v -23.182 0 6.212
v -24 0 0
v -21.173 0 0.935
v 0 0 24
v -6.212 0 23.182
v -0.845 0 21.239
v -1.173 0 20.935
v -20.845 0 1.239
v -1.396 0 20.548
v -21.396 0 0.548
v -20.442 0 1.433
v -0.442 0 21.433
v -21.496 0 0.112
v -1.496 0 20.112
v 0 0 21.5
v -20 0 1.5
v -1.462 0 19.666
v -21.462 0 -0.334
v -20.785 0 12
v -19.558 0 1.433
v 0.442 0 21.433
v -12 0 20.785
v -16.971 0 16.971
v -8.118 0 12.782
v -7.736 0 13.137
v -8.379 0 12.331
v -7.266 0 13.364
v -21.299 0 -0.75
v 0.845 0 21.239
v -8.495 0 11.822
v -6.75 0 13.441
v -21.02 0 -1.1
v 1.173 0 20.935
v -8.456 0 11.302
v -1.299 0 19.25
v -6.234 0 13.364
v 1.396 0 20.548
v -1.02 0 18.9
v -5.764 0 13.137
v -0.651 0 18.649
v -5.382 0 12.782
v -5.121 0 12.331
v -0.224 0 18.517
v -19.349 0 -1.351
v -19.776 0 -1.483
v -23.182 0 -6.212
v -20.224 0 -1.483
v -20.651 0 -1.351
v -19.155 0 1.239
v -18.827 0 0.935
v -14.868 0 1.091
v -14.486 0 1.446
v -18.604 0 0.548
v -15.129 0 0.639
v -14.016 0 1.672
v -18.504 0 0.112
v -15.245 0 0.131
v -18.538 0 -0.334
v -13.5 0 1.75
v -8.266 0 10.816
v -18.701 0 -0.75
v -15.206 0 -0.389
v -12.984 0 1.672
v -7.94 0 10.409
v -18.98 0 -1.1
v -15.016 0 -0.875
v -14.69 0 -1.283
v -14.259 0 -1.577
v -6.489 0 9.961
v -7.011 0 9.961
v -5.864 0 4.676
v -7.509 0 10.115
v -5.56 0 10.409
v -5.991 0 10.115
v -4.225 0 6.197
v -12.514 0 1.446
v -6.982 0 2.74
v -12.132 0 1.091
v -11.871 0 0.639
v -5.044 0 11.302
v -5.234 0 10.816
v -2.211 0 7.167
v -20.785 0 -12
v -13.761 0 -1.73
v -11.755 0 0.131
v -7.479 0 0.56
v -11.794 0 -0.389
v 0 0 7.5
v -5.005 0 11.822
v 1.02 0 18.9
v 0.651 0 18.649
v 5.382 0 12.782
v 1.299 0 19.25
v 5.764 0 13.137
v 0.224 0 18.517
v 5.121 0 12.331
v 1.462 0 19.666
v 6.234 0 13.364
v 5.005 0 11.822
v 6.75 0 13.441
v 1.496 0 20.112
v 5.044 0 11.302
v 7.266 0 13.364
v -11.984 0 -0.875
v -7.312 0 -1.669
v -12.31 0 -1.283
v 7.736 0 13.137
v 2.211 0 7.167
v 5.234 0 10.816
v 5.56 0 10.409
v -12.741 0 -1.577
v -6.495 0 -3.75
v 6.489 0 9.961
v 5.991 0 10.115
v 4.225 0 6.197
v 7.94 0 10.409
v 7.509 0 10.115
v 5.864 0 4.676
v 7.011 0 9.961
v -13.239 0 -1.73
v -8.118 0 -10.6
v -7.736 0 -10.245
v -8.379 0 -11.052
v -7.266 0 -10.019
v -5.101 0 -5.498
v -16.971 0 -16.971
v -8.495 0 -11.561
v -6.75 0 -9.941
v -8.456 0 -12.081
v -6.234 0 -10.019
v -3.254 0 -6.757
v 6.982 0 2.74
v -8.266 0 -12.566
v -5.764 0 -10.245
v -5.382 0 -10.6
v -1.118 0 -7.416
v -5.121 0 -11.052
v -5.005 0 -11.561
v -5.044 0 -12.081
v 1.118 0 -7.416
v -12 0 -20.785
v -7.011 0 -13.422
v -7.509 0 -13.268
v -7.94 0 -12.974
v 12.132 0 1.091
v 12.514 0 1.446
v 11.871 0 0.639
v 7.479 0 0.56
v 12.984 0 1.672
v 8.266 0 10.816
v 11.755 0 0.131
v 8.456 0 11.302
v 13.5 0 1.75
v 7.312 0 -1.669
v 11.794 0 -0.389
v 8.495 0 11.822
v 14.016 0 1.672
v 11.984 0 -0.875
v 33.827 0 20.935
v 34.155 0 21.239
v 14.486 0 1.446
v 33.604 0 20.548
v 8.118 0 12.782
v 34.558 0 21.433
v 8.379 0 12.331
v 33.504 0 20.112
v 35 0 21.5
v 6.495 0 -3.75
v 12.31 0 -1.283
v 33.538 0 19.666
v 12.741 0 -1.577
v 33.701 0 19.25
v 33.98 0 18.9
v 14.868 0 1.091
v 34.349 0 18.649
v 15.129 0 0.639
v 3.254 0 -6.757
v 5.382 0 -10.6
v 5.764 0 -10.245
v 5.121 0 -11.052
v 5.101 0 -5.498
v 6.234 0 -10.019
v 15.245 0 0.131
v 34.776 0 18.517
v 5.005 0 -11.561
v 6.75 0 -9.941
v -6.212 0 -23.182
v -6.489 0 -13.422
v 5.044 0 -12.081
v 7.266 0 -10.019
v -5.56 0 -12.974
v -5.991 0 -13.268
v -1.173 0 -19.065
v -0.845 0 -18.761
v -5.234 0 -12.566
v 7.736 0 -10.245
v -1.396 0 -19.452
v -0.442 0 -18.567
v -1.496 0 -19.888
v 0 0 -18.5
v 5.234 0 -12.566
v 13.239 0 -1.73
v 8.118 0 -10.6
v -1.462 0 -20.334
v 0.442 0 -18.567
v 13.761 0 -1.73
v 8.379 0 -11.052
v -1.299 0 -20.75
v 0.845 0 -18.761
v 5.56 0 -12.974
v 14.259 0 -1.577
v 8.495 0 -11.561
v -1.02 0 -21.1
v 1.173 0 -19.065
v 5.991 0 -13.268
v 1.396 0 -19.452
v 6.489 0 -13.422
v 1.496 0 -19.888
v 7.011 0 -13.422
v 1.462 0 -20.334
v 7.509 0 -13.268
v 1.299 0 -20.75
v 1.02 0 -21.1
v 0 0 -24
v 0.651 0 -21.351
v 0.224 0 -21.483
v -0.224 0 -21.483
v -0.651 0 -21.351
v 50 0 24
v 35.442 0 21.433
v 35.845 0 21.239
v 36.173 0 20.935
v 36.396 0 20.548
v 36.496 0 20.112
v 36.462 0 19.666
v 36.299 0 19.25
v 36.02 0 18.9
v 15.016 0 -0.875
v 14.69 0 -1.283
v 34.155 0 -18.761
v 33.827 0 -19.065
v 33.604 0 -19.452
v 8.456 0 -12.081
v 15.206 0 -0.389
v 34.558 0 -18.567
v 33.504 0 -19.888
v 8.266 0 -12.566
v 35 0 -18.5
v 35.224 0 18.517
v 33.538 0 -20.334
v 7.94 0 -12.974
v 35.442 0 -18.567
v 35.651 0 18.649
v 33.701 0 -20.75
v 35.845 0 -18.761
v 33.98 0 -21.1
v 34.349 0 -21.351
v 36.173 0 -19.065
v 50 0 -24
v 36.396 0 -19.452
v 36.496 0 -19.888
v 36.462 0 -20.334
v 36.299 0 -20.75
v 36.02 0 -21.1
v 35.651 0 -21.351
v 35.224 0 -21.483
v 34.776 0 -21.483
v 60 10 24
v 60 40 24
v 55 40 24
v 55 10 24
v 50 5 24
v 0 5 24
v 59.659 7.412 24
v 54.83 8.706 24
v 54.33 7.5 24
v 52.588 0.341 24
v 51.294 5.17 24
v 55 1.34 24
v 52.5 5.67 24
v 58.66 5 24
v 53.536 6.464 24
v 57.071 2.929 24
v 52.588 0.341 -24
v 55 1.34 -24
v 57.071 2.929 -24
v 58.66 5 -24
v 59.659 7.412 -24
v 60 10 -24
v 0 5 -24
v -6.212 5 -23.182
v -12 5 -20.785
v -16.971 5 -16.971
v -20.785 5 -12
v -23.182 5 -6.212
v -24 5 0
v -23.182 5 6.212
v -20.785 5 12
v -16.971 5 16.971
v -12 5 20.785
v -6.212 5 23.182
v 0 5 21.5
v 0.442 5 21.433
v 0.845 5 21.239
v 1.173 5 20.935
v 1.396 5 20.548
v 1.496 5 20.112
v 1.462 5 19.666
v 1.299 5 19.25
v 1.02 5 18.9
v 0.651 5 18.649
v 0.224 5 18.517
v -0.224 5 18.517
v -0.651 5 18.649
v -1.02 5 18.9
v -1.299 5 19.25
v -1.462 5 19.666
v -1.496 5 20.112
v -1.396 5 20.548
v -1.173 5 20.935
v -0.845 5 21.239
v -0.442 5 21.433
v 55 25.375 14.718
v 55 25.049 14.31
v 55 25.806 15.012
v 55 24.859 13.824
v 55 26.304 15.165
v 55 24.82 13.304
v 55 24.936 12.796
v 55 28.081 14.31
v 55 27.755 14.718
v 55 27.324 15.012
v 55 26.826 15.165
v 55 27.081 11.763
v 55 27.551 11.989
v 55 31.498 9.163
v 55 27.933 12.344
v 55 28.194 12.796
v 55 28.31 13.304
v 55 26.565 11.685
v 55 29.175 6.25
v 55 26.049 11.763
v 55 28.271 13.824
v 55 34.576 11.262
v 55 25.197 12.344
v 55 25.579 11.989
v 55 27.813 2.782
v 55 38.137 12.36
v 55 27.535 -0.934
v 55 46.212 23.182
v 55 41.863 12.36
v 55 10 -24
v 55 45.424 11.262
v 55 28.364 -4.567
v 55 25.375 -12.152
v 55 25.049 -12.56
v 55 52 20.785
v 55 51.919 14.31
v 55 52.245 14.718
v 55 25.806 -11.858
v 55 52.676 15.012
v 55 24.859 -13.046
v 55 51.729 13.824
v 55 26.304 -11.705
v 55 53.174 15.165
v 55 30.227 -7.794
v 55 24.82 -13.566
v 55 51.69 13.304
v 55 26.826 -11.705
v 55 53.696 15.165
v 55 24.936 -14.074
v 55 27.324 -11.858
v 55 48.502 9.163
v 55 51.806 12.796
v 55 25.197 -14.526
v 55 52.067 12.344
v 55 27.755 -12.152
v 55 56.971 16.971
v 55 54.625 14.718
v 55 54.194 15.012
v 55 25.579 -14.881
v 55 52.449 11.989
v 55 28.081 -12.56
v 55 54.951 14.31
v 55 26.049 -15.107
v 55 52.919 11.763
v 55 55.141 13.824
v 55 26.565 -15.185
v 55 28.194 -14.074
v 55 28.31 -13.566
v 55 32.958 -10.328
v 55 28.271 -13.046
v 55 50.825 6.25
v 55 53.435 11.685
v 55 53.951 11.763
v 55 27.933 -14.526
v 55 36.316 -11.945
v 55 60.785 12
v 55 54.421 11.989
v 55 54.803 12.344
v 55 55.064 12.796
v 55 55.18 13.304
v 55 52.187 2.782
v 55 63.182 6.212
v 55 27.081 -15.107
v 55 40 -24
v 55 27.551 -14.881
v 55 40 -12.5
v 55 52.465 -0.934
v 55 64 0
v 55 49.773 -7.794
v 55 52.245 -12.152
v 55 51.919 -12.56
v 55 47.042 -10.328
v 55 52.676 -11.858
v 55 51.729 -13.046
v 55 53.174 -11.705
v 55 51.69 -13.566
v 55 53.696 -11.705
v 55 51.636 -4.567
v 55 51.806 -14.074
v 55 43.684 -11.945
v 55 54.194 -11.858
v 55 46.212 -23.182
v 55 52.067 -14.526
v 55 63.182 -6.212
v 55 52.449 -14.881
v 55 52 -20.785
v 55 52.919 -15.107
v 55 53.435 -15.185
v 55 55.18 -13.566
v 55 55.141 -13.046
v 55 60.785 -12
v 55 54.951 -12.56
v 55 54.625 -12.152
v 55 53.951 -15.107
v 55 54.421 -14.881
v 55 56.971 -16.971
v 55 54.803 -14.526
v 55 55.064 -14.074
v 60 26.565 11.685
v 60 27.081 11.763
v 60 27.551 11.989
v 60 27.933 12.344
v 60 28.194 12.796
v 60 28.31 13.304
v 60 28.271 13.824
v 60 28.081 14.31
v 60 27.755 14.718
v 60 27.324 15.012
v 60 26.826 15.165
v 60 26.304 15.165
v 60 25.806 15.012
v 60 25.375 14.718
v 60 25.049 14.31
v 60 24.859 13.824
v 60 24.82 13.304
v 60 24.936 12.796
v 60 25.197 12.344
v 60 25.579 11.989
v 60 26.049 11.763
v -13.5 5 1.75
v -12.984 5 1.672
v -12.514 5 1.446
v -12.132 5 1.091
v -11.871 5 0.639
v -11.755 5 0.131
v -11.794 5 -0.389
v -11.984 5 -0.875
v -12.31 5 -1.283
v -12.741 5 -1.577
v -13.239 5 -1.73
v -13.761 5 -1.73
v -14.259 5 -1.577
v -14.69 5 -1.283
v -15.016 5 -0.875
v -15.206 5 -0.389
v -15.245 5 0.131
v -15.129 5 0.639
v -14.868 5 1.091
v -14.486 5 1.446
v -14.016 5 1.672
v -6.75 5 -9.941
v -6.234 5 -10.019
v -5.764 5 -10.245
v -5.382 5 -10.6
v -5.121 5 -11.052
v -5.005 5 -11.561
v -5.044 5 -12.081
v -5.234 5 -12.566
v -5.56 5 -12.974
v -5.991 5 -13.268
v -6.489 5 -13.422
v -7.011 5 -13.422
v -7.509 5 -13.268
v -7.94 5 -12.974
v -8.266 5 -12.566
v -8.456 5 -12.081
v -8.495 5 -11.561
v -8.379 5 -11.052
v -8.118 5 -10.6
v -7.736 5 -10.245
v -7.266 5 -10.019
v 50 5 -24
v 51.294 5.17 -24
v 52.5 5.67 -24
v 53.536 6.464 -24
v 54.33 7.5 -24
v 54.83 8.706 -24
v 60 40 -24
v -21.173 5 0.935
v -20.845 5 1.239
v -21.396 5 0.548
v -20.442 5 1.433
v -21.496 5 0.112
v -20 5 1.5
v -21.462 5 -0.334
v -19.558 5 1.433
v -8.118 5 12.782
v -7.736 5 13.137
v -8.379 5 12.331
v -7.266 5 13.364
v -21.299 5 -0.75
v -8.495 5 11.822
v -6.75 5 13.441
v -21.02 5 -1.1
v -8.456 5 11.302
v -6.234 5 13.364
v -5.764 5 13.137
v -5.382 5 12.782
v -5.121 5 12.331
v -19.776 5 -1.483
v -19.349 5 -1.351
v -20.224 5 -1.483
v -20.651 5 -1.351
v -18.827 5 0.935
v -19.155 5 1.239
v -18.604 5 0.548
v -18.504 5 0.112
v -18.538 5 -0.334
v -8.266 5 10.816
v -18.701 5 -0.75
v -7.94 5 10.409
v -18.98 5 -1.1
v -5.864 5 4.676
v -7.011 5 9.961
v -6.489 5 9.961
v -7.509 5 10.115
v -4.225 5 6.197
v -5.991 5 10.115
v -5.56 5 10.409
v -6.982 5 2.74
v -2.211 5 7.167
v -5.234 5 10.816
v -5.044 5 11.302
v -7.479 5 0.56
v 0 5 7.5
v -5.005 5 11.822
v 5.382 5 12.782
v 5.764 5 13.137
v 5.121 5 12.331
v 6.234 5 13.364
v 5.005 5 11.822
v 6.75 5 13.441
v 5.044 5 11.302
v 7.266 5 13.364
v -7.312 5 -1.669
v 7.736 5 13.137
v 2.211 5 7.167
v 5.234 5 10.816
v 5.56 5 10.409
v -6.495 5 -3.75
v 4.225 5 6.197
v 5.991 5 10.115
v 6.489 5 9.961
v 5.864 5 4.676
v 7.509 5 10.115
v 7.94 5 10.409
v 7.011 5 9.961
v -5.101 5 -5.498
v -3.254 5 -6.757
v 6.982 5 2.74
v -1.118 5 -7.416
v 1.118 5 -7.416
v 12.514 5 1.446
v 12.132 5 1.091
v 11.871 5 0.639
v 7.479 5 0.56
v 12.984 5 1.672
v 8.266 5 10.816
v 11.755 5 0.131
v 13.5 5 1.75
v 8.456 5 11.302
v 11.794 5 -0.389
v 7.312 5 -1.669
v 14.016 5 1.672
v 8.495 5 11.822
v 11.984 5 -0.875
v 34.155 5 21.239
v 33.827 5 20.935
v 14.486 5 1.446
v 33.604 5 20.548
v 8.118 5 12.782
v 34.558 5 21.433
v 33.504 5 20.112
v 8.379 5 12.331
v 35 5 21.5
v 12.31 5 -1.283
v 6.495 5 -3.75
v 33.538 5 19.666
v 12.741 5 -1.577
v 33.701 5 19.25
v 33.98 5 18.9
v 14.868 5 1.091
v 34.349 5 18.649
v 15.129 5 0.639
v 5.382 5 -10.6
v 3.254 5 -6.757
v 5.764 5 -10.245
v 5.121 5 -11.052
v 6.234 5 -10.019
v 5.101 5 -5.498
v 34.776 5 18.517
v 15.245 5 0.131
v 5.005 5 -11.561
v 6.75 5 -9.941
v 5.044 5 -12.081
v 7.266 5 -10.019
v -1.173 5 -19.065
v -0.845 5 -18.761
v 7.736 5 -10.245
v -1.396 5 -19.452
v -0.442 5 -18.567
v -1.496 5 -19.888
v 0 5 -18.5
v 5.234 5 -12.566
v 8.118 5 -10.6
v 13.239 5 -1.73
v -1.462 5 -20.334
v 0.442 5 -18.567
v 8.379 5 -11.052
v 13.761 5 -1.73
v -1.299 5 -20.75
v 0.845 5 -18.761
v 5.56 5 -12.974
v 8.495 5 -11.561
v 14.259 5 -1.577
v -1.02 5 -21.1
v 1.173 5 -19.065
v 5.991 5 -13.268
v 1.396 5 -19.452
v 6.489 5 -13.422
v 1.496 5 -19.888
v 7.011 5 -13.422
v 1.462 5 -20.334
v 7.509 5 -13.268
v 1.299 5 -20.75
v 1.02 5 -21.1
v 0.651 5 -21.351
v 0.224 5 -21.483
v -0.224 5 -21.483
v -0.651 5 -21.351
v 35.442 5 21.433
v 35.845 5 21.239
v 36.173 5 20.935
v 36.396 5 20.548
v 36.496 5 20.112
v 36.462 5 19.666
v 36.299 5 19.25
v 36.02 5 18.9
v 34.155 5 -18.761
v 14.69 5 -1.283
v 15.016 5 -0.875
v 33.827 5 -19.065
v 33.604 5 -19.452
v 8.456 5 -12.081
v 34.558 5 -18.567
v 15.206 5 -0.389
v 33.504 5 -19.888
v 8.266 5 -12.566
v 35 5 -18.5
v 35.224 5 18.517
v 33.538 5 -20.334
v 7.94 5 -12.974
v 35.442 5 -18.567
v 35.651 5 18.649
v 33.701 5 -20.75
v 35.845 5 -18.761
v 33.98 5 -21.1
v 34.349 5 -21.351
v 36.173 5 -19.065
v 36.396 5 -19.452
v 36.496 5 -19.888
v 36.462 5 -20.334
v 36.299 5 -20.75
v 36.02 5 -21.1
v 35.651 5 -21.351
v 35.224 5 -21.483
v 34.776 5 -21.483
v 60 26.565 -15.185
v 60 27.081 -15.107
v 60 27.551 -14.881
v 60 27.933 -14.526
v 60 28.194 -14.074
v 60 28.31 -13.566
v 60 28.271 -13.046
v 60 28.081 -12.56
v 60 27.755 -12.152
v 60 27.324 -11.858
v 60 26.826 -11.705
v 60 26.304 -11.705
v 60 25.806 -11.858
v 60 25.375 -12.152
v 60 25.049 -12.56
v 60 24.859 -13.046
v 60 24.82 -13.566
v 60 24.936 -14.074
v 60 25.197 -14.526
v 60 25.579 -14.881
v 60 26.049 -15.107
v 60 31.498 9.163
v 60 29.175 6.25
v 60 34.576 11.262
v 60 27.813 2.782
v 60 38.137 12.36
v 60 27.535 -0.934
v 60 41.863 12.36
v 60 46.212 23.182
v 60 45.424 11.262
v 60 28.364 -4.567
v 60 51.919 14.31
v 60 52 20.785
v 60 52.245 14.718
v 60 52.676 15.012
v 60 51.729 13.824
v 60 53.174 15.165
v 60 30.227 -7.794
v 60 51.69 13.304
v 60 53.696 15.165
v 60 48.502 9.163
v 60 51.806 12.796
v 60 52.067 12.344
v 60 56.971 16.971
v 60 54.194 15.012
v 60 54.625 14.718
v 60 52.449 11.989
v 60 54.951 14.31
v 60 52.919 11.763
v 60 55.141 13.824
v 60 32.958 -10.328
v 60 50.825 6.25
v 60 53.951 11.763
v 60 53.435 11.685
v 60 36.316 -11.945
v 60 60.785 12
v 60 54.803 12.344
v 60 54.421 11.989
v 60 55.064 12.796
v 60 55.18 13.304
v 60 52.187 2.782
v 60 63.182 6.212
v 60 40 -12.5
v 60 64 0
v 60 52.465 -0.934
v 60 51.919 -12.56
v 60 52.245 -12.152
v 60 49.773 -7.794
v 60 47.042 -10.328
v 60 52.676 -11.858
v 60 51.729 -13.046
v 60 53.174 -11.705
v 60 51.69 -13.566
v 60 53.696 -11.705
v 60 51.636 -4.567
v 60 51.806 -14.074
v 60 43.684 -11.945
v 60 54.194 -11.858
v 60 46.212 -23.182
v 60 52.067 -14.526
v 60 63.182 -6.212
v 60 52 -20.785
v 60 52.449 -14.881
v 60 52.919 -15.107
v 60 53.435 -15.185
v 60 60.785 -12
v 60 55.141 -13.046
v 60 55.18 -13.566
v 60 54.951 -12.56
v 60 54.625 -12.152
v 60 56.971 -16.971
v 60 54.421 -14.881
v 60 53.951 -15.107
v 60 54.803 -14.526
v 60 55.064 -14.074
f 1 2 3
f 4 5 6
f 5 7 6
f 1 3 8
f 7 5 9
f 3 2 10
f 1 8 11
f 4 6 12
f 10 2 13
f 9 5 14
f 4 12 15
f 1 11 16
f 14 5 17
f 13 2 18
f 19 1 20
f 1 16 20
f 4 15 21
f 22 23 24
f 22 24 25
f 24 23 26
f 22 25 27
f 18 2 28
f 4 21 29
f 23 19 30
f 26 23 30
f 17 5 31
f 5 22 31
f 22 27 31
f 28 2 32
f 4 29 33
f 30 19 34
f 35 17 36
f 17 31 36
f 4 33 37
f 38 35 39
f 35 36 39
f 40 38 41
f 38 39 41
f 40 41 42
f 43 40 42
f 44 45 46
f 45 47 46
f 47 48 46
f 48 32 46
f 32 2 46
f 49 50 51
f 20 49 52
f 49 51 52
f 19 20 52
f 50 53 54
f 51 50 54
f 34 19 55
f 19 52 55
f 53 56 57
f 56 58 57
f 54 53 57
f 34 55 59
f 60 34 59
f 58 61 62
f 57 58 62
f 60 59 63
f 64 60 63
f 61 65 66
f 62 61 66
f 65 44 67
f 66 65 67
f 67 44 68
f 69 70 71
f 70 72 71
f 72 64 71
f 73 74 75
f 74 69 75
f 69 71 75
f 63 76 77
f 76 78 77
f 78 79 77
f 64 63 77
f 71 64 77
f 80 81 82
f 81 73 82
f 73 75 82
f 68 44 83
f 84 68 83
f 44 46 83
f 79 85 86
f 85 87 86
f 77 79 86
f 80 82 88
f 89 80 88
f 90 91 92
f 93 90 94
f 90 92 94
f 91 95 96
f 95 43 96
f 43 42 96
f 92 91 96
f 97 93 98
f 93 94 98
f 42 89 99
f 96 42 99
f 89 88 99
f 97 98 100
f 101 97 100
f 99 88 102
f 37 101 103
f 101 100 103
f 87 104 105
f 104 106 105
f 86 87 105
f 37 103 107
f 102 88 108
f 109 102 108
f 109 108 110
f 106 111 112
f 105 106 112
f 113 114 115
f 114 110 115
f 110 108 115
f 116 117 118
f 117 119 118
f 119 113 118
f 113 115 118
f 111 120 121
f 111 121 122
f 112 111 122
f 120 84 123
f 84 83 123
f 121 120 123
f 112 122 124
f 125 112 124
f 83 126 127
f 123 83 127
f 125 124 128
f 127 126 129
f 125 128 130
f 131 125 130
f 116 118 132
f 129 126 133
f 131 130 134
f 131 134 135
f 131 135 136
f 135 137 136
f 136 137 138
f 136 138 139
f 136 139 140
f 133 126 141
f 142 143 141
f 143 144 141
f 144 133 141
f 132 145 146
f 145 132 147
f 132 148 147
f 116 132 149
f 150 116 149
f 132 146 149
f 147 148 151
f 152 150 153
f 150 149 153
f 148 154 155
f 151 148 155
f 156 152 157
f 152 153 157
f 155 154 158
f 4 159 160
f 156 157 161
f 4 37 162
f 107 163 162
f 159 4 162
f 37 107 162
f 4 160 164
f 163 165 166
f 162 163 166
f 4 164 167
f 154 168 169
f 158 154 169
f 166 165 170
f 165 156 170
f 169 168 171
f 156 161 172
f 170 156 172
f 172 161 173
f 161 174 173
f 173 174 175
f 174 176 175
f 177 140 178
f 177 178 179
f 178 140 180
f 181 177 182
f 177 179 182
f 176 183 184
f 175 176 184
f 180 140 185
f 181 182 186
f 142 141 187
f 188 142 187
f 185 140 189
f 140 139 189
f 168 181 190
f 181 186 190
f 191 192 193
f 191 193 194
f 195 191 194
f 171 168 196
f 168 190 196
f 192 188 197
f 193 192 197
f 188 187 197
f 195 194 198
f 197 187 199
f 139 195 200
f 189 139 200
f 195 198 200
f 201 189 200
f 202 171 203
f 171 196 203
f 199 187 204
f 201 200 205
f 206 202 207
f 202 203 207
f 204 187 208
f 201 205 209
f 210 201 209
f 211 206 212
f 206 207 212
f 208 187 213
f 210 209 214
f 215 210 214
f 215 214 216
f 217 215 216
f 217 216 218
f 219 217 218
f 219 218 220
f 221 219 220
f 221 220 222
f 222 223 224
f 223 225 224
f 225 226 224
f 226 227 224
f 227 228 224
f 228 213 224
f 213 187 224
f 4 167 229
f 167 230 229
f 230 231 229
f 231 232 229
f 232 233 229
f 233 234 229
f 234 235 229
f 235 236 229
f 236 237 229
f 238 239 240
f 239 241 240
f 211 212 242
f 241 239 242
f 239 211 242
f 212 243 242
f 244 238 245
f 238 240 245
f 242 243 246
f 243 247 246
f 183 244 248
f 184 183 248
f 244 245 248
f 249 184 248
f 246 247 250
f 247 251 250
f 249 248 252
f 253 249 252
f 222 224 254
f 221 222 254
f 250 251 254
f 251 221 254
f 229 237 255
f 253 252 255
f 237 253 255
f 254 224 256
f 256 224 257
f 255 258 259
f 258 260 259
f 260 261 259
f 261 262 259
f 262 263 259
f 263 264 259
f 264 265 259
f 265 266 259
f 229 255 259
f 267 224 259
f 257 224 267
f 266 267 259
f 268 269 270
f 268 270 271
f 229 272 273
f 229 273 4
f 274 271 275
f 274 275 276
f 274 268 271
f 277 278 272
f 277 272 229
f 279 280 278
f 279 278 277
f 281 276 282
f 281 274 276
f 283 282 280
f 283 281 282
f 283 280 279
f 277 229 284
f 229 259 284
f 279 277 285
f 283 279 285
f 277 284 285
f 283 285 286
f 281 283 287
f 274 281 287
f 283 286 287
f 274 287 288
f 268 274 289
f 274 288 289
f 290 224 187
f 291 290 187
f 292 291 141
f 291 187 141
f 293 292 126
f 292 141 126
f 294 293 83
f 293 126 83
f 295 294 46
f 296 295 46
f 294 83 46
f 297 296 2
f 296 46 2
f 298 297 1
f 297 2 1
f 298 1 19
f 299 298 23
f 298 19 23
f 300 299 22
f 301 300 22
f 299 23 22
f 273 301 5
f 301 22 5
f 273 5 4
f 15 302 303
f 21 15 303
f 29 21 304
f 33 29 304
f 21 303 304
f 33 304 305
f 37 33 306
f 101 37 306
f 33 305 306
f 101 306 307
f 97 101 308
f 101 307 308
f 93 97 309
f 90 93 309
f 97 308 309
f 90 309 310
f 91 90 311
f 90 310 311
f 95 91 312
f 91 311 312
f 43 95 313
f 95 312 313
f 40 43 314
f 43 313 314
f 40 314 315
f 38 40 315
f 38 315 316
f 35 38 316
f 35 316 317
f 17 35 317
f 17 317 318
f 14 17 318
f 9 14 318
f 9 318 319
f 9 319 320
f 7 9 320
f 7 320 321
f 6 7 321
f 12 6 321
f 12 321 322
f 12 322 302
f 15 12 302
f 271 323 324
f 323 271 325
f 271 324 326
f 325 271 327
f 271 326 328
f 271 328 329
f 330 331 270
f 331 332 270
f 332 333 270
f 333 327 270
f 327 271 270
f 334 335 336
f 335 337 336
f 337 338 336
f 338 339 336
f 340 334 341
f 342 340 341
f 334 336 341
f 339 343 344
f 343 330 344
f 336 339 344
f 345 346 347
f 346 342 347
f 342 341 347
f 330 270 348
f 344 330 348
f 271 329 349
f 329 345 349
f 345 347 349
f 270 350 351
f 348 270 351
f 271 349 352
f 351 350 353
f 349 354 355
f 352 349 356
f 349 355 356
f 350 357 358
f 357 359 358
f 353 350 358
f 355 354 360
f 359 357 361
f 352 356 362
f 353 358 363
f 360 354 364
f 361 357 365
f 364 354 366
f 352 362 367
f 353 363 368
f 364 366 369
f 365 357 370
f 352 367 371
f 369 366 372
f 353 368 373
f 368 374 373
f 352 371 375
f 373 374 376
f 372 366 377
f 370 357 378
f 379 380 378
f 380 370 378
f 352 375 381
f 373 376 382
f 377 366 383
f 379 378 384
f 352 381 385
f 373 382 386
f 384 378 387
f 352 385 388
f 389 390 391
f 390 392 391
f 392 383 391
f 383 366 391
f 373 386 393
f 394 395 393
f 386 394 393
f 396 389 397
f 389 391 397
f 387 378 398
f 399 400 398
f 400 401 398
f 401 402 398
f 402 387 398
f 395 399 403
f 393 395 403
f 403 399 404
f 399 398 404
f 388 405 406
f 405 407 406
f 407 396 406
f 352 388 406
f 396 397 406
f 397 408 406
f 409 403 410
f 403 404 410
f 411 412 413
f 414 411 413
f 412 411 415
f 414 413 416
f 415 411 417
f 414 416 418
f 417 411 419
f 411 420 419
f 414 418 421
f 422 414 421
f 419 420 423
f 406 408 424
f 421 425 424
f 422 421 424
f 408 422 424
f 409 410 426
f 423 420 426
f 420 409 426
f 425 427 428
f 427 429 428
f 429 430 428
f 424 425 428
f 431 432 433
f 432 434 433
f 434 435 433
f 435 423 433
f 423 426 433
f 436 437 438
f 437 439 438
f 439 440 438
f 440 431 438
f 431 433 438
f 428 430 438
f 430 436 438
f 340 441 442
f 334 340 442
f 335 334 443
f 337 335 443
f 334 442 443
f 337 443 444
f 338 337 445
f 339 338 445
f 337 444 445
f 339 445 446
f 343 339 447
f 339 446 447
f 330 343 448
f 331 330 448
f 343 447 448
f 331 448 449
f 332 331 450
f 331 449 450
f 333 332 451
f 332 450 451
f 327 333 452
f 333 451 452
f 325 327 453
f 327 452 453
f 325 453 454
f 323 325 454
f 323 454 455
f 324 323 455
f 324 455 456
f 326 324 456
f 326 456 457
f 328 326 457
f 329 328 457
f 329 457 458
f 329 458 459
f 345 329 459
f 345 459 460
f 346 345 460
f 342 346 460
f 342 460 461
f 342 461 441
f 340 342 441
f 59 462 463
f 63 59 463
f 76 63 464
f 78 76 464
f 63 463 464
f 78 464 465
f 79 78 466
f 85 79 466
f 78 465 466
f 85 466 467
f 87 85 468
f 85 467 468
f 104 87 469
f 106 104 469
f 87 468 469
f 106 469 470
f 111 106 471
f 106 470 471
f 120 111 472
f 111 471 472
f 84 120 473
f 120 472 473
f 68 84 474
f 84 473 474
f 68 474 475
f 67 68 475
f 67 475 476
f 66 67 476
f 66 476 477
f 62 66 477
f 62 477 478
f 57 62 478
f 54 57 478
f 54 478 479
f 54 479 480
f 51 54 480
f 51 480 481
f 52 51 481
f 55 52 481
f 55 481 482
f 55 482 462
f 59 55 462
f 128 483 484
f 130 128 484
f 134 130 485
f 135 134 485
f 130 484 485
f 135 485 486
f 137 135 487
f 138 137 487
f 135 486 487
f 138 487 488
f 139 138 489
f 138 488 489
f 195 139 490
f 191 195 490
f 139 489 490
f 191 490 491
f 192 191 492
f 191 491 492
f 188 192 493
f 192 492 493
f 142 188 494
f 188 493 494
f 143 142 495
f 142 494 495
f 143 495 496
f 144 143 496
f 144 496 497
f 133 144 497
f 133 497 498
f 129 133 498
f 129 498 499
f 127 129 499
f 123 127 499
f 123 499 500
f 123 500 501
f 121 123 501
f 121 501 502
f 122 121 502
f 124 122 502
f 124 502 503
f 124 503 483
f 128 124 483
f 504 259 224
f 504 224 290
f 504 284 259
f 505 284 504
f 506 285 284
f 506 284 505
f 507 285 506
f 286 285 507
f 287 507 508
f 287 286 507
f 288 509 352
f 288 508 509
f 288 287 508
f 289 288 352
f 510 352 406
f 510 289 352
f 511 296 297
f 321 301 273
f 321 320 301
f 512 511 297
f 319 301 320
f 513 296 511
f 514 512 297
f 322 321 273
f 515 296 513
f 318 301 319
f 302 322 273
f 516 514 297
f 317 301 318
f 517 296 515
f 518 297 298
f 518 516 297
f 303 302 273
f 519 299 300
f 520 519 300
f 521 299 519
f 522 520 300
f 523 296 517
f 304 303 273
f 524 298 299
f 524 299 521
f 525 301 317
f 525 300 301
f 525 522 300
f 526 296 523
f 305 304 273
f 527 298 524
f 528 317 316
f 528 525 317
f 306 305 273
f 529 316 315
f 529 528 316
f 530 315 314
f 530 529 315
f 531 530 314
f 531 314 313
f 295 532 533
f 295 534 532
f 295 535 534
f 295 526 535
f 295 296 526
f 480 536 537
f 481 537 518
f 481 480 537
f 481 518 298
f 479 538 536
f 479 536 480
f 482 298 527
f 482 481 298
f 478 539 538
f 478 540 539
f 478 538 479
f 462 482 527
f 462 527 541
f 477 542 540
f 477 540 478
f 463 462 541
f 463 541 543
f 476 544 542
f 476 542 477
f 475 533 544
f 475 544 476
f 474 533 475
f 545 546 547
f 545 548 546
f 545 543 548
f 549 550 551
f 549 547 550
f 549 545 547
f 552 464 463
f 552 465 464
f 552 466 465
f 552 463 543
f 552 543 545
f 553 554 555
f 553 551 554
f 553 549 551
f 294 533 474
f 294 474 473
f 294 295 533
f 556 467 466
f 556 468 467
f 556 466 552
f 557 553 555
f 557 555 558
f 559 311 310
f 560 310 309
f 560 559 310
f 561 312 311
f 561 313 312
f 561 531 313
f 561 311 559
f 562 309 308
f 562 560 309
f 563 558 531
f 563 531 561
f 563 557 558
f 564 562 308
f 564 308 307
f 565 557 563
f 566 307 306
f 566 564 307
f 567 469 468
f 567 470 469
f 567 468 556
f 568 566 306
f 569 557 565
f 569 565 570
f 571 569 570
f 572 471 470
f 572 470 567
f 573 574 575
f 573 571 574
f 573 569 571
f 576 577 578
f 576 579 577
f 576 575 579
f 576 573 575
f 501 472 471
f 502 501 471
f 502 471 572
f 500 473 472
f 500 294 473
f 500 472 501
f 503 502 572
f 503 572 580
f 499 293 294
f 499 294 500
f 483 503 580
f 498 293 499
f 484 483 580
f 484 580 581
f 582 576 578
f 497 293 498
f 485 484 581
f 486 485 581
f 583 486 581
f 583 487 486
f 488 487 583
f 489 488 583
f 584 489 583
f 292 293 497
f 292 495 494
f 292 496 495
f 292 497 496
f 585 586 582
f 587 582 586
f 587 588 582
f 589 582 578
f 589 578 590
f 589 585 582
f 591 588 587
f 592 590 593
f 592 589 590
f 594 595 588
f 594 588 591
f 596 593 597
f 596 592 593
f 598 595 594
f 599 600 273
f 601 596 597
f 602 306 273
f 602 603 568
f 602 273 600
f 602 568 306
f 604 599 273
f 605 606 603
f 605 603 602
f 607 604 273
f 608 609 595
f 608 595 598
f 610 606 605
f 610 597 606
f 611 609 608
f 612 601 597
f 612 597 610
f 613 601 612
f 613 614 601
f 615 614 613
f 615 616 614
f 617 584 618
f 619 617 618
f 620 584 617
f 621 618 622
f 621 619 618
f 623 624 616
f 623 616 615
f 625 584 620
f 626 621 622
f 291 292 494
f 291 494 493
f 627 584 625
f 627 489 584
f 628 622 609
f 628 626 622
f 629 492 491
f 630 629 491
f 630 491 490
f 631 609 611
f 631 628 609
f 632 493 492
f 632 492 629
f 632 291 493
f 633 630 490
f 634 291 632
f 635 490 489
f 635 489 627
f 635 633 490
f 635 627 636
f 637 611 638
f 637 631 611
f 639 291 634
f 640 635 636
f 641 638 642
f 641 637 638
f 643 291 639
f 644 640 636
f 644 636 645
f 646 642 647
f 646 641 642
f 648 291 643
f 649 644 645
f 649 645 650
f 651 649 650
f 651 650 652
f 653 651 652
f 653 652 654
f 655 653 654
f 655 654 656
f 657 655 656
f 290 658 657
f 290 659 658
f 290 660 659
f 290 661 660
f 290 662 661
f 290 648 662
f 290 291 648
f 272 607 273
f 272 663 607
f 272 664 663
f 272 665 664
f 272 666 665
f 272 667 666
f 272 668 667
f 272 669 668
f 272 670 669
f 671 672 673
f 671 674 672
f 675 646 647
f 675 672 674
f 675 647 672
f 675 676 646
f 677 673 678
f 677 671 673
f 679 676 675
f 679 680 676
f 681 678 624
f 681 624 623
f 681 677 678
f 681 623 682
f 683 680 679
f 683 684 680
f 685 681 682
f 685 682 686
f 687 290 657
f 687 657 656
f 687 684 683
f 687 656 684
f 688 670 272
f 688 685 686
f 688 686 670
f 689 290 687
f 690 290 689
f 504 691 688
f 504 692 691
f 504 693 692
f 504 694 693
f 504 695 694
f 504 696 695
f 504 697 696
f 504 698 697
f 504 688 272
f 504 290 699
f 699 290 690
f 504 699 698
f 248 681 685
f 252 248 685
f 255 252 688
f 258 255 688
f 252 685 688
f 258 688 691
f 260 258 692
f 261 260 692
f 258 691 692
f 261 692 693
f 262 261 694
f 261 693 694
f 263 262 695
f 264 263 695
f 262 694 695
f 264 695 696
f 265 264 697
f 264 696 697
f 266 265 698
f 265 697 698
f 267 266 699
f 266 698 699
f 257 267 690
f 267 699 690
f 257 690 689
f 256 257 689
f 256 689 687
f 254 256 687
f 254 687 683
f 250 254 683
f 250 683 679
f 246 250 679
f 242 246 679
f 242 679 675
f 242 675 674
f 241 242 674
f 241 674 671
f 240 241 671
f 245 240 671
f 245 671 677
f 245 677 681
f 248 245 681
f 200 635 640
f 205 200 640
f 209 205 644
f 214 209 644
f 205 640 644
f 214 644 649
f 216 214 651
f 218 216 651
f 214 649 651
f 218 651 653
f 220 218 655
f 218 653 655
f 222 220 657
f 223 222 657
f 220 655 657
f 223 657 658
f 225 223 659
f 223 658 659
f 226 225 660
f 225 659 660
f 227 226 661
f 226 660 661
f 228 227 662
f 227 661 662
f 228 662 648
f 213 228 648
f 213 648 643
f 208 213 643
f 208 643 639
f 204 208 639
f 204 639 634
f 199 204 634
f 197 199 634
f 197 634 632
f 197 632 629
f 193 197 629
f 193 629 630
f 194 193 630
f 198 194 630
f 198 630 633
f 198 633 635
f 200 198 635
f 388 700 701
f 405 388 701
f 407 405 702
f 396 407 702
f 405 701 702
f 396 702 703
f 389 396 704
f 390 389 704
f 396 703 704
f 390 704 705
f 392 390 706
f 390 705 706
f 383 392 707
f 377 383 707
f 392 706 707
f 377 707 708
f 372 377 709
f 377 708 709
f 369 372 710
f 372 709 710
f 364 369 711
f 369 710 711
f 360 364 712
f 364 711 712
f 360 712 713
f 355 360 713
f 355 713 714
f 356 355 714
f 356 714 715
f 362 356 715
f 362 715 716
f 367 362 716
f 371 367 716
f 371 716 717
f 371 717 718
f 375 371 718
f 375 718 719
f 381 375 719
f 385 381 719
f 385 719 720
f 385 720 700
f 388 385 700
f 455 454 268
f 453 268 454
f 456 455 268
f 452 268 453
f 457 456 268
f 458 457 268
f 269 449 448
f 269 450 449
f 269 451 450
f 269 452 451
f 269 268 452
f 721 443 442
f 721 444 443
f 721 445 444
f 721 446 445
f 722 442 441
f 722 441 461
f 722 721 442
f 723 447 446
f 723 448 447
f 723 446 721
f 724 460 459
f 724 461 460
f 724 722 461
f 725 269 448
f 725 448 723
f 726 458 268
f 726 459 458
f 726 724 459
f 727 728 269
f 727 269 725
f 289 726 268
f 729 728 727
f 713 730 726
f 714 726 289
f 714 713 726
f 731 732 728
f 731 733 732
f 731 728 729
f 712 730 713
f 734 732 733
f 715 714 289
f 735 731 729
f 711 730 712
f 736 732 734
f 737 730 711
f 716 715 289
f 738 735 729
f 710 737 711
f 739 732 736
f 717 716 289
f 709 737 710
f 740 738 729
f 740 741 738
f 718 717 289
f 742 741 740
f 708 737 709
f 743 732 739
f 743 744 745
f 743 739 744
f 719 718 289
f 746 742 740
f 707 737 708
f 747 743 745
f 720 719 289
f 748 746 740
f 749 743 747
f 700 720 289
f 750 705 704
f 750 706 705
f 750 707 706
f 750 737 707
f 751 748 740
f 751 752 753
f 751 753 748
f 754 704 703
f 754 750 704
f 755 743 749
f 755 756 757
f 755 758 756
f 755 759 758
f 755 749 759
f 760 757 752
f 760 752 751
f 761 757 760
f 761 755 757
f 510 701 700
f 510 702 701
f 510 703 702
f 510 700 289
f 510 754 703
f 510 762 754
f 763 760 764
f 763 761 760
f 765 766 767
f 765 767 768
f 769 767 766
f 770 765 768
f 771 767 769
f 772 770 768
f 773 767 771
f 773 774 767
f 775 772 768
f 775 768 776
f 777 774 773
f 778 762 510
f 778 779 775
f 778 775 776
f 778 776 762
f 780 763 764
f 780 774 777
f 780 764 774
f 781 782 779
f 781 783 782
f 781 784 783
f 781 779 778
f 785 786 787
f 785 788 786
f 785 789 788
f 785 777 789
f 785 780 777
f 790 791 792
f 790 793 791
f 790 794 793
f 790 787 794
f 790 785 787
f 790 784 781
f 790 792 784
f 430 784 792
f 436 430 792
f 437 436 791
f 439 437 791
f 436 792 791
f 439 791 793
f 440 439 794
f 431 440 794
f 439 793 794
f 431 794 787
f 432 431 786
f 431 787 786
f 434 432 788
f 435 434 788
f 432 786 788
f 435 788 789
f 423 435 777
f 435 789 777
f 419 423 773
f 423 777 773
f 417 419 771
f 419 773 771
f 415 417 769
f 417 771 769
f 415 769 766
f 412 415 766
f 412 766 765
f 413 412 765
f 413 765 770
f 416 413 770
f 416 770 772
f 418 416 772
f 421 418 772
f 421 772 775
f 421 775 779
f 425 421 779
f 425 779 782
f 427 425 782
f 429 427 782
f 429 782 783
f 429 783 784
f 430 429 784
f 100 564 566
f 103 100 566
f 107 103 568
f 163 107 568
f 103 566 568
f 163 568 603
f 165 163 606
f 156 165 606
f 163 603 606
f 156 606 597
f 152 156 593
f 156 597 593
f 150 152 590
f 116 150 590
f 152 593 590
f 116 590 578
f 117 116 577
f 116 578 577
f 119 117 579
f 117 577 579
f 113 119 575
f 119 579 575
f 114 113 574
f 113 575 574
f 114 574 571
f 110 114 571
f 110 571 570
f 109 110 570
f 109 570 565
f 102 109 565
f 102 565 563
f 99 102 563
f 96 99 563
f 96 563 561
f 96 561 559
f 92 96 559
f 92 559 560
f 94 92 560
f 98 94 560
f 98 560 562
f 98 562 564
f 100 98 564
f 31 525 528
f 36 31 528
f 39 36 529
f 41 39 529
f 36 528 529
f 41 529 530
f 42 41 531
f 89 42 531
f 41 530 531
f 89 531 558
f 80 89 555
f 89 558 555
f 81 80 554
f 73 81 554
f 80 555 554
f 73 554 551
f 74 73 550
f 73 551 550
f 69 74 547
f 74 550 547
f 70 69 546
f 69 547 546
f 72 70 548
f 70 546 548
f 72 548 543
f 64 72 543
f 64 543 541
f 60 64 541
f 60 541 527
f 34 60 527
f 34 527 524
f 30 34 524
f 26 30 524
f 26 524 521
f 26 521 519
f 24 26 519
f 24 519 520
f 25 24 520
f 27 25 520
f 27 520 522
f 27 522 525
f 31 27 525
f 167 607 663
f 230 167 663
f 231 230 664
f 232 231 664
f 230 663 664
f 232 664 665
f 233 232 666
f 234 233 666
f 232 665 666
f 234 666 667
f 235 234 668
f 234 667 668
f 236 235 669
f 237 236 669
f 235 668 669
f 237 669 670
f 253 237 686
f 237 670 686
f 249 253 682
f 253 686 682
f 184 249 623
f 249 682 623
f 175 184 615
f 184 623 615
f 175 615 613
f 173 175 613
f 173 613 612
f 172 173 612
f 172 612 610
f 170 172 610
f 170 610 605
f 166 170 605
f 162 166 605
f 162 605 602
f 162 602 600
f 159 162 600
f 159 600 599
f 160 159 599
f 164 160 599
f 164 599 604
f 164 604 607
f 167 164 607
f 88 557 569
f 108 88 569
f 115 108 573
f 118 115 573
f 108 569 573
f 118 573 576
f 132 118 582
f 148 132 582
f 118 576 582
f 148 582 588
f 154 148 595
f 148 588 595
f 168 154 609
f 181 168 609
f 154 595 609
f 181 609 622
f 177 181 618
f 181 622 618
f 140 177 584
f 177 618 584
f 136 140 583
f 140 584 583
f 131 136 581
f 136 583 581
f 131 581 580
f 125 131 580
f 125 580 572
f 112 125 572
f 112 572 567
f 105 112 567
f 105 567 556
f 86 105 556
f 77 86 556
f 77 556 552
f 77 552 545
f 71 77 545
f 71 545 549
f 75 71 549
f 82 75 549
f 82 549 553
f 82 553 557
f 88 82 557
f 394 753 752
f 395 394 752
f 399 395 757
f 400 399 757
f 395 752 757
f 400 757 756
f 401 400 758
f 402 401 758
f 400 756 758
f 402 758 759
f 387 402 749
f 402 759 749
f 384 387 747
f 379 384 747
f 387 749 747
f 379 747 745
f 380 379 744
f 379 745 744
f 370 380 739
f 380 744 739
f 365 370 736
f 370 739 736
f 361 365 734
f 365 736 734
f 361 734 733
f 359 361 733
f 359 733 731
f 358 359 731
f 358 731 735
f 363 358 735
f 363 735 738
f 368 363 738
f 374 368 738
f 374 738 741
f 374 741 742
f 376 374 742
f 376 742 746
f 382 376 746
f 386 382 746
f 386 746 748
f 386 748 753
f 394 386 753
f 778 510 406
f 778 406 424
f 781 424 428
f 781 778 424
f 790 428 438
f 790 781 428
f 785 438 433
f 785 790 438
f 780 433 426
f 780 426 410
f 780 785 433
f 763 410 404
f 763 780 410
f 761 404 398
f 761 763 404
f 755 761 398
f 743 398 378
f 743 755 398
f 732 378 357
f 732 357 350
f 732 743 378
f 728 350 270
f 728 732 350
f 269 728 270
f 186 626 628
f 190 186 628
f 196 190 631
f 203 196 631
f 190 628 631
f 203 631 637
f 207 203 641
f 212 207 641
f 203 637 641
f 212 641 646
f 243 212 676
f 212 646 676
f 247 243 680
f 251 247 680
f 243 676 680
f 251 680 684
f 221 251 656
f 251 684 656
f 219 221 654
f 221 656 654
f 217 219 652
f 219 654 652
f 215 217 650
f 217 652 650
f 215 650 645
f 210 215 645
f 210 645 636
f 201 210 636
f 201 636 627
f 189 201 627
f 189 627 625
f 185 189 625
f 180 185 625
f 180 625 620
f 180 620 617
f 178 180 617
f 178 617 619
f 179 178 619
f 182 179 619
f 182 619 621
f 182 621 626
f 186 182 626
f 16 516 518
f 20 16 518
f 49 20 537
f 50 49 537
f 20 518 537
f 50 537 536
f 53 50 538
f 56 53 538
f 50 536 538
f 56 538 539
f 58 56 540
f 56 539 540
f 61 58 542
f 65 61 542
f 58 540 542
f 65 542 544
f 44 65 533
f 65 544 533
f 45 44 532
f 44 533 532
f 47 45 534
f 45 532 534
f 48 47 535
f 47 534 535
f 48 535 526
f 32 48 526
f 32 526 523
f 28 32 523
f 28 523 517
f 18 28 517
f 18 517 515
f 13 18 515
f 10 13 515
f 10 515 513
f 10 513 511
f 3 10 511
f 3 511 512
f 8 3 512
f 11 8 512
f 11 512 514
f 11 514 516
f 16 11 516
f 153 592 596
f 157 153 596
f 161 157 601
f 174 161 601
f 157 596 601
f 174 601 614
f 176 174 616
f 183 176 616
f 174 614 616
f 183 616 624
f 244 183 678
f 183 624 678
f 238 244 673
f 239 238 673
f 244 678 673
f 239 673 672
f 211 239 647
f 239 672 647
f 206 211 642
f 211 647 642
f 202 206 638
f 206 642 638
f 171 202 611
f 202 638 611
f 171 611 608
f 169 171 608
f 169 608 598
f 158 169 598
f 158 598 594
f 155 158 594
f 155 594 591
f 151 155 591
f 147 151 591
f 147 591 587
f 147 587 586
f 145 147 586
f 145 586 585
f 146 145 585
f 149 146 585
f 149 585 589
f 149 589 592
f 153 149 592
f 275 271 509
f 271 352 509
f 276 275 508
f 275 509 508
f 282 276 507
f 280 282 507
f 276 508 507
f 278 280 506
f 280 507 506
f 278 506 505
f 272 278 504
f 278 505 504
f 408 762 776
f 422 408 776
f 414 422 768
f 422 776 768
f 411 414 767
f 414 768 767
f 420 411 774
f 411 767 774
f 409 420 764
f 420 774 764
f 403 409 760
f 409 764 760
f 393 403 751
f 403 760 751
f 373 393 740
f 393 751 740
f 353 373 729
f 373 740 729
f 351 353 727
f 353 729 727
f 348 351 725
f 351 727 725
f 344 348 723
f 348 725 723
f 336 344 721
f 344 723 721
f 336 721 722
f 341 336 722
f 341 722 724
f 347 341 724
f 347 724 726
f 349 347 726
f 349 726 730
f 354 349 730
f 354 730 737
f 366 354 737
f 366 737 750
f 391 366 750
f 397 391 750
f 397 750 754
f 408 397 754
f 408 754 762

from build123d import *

# Parameters (mm, degrees)
EXTRUDE_1_DEPTH     = 5
EXTRUDE_2_DEPTH     = 5
SKETCH_3_R          = 1.75
CUT_EXTRUDE_1_DEPTH = 21
SKETCH_4_R          = 1.75
CUT_EXTRUDE_2_DEPTH = 21
FILLET_1_R          = 5
FILLET_2_R          = 10
SKETCH_6_R          = 1.5
CUT_EXTRUDE_4_DEPTH = 10
SKETCH_7_R          = 7.5
CUT_EXTRUDE_5_DEPTH = 10
SKETCH_8_R          = 12.5
CUT_EXTRUDE_6_DEPTH = 10


with BuildPart() as part:
    # 草图1 → 凸台-拉伸1 (new body)
    with BuildSketch(Plane(origin=(0, 0, 0), x_dir=(1, 0, 0), z_dir=(0, 1, 0))):
        with BuildLine():
            ThreePointArc((0, 24), (-24, 0), (0, -24))
            Line((0, -24), (60, -24))
            Line((60, -24), (60, 24))
            Line((60, 24), (0, 24))
        make_face()
    extrude(amount=EXTRUDE_1_DEPTH)

    # 草图2 → 凸台-拉伸2 (add)
    with BuildSketch(Plane(origin=(60, 0, 0), x_dir=(0, 0, -1), z_dir=(1, 0, 0))):
        with BuildLine():
            ThreePointArc((24, 40), (0, 64), (-24, 40))
            Line((-24, 40), (-24, 0))
            Line((-24, 0), (24, 0))
            Line((24, 0), (24, 40))
        make_face()
    extrude(amount=-EXTRUDE_2_DEPTH)

    # 草图3 → 切除-拉伸1 (cut)
    with BuildSketch(Plane(origin=(0, 5, 0), x_dir=(1, 0, 0), z_dir=(0, 1, 0))):
        with Locations(Location((-13.5, 0, 0), (0, 0, 270))):
            Circle(SKETCH_3_R)
        with Locations(Location((-6.75, 11.691342951, 0), (0, 0, 270))):
            Circle(SKETCH_3_R)
        with Locations(Location((6.75, 11.691342951, 0), (0, 0, 270))):
            Circle(SKETCH_3_R)
        with Locations(Location((13.5, 0, 0), (0, 0, 270))):
            Circle(SKETCH_3_R)
        with Locations(Location((6.75, -11.691342951, 0), (0, 0, 270))):
            Circle(SKETCH_3_R)
        with Locations(Location((-6.75, -11.691342951, 0), (0, 0, 270))):
            Circle(SKETCH_3_R)
    extrude(amount=-CUT_EXTRUDE_1_DEPTH, mode=Mode.SUBTRACT)

    # 草图4 → 切除-拉伸2 (cut)
    with BuildSketch(Plane(origin=(60, 0, 0), x_dir=(0, 0, -1), z_dir=(1, 0, 0))):
        with Locations((-13.435028843, 53.435028843)):
            Circle(SKETCH_4_R)
        with Locations((13.435028843, 53.435028843)):
            Circle(SKETCH_4_R)
        with Locations((13.435028843, 26.564971157)):
            Circle(SKETCH_4_R)
        with Locations((-13.435028843, 26.564971157)):
            Circle(SKETCH_4_R)
    extrude(amount=-CUT_EXTRUDE_2_DEPTH, mode=Mode.SUBTRACT)

    # 圆角1
    fillet_1_edges = [part.edges().sort_by_distance(p)[0] for p in [
        (55, 5, 0),
    ]]
    fillet(fillet_1_edges, radius=FILLET_1_R)

    # 圆角2
    fillet_2_edges = [part.edges().sort_by_distance(p)[0] for p in [
        (60, 0, 0),
    ]]
    fillet(fillet_2_edges, radius=FILLET_2_R)

    # 草图6 → 切除-拉伸4 (cut)
    with BuildSketch(Plane(origin=(0, 5, 0), x_dir=(1, 0, 0), z_dir=(0, 1, 0))):
        with Locations(Location((0, 20, 0), (0, 0, 270))):
            Circle(SKETCH_6_R)
        with Locations(Location((35, 20, 0), (0, 0, 270))):
            Circle(SKETCH_6_R)
        with Locations(Location((35, -20, 0), (0, 0, 270))):
            Circle(SKETCH_6_R)
        with Locations(Location((0, -20, 0), (0, 0, 270))):
            Circle(SKETCH_6_R)
        with Locations(Location((-20, 0, 0), (0, 0, 270))):
            Circle(SKETCH_6_R)
    extrude(amount=-CUT_EXTRUDE_4_DEPTH, mode=Mode.SUBTRACT)

    # 草图7 → 切除-拉伸5 (cut)
    with BuildSketch(Plane(origin=(0, 5, 0), x_dir=(1, 0, 0), z_dir=(0, 1, 0))):
        with Locations(Location((0, 0, 0), (0, 0, 270))):
            Circle(SKETCH_7_R)
    extrude(amount=-CUT_EXTRUDE_5_DEPTH, mode=Mode.SUBTRACT)

    # 草图8 → 切除-拉伸6 (cut)
    with BuildSketch(Plane(origin=(60, 0, 0), x_dir=(0, 0, -1), z_dir=(1, 0, 0))):
        with Locations((0, 40)):
            Circle(SKETCH_8_R)
    extrude(amount=-CUT_EXTRUDE_6_DEPTH, mode=Mode.SUBTRACT)


solid = part.part
